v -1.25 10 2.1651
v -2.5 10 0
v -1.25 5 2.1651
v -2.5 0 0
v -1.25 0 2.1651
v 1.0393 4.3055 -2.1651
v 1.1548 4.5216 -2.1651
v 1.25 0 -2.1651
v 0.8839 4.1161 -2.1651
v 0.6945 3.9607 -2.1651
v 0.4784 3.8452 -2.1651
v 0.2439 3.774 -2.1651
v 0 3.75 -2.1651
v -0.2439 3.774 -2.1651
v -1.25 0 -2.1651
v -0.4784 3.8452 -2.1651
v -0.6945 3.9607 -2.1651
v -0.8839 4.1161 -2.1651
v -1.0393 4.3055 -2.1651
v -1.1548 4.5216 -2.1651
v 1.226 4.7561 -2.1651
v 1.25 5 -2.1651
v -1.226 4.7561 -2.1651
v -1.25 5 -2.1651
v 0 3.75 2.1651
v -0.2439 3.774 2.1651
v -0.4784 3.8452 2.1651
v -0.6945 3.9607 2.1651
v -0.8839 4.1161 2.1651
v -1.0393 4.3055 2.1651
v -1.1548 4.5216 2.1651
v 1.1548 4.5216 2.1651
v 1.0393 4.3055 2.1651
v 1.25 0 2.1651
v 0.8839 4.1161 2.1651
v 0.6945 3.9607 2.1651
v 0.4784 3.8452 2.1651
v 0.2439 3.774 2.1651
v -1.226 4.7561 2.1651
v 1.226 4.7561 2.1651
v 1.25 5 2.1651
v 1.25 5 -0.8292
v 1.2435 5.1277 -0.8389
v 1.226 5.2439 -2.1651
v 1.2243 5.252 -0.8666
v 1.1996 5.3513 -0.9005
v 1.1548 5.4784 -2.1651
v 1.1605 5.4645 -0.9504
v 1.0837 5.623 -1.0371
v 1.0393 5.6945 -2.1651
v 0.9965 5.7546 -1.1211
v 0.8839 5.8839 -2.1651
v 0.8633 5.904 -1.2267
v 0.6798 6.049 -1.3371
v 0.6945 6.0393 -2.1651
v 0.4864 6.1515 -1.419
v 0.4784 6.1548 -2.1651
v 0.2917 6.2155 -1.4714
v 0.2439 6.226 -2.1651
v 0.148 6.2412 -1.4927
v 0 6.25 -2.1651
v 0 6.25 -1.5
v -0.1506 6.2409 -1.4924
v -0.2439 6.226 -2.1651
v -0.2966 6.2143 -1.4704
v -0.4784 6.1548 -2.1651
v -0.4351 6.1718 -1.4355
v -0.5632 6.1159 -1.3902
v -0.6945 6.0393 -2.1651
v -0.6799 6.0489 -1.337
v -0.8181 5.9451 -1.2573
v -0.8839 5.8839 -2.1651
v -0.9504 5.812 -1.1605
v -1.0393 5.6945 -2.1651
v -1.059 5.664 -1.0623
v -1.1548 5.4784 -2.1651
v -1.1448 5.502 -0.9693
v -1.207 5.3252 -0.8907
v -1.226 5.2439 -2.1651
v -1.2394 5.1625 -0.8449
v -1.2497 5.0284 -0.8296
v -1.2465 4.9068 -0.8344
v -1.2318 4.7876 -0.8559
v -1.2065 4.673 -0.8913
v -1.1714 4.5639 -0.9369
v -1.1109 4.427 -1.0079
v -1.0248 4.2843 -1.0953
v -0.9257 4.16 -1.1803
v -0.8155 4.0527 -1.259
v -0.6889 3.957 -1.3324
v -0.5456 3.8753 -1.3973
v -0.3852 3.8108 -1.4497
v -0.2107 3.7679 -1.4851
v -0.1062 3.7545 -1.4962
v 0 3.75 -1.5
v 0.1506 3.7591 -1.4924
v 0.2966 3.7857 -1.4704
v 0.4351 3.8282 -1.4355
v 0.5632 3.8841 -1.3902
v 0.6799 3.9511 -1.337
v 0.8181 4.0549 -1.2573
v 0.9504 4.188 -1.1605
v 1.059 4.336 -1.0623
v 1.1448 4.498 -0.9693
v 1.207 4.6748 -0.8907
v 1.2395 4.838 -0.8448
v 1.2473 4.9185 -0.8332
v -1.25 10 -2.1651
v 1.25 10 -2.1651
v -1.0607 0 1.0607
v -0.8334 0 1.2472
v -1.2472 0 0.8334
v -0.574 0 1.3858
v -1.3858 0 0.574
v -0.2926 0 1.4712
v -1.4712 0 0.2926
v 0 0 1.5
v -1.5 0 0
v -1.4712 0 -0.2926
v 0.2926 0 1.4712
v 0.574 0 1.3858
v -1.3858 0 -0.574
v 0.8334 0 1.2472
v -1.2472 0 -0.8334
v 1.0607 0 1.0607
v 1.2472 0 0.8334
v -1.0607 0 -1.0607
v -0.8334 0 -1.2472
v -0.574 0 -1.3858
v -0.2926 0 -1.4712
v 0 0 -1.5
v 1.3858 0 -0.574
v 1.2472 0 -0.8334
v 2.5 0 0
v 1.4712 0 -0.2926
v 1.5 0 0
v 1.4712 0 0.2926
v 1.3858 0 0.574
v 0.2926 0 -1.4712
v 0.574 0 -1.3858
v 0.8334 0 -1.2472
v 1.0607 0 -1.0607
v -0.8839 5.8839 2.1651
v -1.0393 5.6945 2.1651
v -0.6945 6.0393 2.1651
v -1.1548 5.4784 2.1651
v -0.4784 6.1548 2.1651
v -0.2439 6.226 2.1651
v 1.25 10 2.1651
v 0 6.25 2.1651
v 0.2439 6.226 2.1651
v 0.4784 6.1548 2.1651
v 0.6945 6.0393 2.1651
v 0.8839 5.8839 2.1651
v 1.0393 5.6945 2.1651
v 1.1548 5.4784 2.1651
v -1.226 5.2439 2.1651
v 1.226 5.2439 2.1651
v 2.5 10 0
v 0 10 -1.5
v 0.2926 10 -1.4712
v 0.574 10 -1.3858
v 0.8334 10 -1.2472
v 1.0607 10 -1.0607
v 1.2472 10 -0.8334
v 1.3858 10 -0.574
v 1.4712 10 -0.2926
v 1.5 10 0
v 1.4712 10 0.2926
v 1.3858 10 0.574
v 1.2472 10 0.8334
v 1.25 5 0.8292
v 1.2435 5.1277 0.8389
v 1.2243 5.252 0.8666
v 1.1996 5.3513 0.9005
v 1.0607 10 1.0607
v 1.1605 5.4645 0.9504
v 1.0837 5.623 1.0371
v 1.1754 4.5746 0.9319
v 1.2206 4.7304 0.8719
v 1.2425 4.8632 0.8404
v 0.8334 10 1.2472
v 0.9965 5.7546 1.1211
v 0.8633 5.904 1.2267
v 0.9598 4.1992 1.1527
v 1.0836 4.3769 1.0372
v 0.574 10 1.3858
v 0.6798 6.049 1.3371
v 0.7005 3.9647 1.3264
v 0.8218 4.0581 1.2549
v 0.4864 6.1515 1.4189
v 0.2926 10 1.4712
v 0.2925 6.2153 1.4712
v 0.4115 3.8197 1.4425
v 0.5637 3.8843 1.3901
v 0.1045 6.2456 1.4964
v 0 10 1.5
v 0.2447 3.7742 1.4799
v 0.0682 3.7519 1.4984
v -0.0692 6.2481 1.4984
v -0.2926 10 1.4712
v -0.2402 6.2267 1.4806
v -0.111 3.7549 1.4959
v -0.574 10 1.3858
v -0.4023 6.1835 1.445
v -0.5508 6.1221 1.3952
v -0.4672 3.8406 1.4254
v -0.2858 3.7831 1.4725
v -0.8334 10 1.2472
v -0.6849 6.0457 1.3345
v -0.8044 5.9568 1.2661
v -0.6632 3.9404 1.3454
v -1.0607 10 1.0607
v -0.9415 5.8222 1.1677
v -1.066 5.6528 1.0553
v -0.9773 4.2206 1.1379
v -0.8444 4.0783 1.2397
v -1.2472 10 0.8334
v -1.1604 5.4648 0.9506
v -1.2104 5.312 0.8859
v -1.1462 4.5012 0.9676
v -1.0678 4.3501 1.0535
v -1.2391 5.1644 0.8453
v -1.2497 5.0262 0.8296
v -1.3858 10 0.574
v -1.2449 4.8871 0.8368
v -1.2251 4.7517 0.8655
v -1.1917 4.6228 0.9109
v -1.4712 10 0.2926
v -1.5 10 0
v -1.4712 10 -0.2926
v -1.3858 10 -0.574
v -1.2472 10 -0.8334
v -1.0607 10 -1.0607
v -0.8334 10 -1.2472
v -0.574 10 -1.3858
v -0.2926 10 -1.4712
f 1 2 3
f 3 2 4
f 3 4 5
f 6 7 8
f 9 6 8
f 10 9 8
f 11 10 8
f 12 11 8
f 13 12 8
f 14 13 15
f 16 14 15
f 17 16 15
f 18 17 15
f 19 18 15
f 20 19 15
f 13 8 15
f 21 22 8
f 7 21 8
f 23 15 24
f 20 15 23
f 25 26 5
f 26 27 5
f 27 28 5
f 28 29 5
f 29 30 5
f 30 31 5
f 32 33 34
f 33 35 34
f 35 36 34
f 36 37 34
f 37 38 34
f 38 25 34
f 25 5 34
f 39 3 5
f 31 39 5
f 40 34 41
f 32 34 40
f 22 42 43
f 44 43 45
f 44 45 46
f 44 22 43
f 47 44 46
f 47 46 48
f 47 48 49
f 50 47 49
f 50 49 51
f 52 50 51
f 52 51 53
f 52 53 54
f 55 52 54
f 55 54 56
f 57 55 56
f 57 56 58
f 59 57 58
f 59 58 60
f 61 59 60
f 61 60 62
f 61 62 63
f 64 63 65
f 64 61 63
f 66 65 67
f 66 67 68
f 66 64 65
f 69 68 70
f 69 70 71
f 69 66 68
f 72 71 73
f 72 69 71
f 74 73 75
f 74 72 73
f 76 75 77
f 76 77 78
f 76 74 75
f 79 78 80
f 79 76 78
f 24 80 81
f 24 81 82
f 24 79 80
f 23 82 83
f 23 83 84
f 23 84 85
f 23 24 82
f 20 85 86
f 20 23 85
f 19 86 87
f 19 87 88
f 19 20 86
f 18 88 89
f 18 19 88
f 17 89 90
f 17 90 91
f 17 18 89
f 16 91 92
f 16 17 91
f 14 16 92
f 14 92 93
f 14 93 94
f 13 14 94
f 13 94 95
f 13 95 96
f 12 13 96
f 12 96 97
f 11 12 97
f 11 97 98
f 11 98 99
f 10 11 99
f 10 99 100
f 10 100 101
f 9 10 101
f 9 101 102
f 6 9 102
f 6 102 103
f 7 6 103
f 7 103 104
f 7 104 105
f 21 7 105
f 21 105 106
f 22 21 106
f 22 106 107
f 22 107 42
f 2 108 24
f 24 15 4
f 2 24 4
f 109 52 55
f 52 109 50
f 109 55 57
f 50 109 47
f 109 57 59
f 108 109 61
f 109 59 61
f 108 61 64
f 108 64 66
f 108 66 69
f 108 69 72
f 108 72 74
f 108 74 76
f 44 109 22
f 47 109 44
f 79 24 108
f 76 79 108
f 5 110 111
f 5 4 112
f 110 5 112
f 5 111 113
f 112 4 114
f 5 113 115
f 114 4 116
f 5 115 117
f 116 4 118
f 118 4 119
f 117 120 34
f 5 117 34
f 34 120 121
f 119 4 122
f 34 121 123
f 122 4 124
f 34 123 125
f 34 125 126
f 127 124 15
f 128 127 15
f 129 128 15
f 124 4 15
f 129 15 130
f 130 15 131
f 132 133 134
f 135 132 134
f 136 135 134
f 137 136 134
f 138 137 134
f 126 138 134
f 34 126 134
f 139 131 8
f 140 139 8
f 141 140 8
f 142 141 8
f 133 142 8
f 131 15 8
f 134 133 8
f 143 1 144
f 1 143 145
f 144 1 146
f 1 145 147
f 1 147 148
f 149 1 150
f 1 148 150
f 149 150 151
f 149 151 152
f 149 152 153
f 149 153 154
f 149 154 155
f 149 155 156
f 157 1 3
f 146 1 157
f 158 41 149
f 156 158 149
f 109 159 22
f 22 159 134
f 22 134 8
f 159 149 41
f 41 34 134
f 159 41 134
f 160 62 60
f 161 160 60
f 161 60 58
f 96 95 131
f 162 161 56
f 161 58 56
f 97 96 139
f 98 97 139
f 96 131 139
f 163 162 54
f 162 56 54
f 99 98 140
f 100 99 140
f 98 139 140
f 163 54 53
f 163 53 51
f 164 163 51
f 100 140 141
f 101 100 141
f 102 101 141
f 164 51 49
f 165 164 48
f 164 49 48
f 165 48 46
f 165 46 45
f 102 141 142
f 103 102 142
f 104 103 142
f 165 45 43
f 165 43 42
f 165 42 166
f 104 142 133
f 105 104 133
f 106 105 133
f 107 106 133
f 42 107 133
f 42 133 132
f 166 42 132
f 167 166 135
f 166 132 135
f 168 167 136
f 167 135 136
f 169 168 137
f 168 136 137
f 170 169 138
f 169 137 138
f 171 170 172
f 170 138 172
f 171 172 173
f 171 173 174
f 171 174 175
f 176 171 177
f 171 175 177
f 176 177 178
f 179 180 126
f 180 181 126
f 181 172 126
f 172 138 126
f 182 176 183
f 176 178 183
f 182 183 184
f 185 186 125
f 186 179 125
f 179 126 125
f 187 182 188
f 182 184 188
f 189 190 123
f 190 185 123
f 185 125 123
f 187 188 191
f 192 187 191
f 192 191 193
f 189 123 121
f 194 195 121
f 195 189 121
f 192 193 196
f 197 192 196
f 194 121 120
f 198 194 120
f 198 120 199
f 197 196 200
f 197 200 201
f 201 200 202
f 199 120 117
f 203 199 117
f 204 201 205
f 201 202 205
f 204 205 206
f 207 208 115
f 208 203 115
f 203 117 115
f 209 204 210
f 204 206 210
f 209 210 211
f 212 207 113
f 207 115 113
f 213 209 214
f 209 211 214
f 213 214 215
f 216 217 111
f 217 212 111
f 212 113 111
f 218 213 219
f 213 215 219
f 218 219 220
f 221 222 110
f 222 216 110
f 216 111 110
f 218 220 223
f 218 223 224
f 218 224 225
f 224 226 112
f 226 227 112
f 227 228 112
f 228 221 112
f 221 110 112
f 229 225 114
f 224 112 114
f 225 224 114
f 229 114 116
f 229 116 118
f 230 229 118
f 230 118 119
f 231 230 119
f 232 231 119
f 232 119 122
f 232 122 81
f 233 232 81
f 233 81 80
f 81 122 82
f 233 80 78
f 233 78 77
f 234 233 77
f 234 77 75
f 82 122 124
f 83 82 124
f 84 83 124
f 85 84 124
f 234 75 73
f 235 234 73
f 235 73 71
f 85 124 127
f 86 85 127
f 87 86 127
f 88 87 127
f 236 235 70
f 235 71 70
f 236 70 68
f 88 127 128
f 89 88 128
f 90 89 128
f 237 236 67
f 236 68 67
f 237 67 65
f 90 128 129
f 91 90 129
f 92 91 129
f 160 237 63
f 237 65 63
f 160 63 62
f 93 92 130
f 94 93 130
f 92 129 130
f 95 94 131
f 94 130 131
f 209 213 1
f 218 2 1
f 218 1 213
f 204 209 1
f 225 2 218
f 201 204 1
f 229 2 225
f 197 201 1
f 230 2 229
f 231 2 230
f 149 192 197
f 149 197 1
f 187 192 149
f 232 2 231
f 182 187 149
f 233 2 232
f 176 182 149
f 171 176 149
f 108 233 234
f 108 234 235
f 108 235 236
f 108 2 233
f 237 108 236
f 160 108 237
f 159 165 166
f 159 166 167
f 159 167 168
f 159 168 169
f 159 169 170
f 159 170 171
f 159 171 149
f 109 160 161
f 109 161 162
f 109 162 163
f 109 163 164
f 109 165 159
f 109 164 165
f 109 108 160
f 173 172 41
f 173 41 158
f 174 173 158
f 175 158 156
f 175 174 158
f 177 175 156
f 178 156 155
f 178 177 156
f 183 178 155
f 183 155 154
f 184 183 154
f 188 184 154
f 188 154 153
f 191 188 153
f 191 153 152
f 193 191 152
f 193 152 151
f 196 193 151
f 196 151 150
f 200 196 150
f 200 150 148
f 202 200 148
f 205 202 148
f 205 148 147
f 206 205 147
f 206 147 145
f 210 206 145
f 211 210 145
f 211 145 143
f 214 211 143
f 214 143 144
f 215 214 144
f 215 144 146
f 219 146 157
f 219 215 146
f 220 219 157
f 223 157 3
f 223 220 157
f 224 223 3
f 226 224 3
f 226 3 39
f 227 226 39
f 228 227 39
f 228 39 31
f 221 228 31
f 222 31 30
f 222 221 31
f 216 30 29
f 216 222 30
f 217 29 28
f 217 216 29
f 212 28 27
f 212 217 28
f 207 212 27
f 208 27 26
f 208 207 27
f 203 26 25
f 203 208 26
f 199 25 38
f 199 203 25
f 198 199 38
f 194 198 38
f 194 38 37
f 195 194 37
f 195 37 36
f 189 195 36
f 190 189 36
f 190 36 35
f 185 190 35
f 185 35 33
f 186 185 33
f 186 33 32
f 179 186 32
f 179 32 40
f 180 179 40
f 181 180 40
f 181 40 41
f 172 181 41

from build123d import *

# Parameters (mm, degrees)
EXTRUDE_1_DEPTH          = 10
SKETCH_2_R               = 1.5
EXTRUDE_2_DEPTH          = 5
SKETCH_3_R               = 1.5
CUT_EXTRUDE_1_DEPTH      = 16.360257159
CUT_EXTRUDE_2_DEPTH      = 11.532687216
CUT_EXTRUDE_2_DEPTH_BACK = 11.532687216
SKETCH_4_R               = 1.25


with BuildPart() as part:
    # Эскиз1 → Бобышка-Вытянуть1 (new body)
    with BuildSketch(Plane(origin=(0, 0, 0), x_dir=(1, 0, 0), z_dir=(0, 1, 0))):
        Polygon((1.25, -2.165063509), (2.5, 0), (1.25, 2.165063509), (-1.25, 2.165063509), (-2.5, 0), (-1.25, -2.165063509), align=None)
    extrude(amount=EXTRUDE_1_DEPTH)

    # Эскиз2 → Бобышка-Вытянуть2 (add)
    with BuildSketch(Plane(origin=(0, 10, 0), x_dir=(1, 0, 0), z_dir=(0, 1, 0))):
        with Locations(Location((0, 0, 0), (0, 0, 270))):
            Circle(SKETCH_2_R)
    extrude(amount=EXTRUDE_2_DEPTH)

    # Эскиз3 → Вырез-Вытянуть1 (cut, through all)
    with BuildSketch(Plane.XZ):
        with Locations(Location((0, 0, 0), (0, 0, 270))):
            Circle(SKETCH_3_R)
    extrude(amount=-CUT_EXTRUDE_1_DEPTH, mode=Mode.SUBTRACT)

    # Эскиз4 → Вырез-Вытянуть2 (cut, two sides: drawn at the far end of the back side and taken through both)
    with BuildSketch(Plane.XY.offset(-CUT_EXTRUDE_2_DEPTH_BACK)):
        with Locations((0, 5)):
            Circle(SKETCH_4_R)
    extrude(amount=CUT_EXTRUDE_2_DEPTH + CUT_EXTRUDE_2_DEPTH_BACK, mode=Mode.SUBTRACT)


solid = part.part
